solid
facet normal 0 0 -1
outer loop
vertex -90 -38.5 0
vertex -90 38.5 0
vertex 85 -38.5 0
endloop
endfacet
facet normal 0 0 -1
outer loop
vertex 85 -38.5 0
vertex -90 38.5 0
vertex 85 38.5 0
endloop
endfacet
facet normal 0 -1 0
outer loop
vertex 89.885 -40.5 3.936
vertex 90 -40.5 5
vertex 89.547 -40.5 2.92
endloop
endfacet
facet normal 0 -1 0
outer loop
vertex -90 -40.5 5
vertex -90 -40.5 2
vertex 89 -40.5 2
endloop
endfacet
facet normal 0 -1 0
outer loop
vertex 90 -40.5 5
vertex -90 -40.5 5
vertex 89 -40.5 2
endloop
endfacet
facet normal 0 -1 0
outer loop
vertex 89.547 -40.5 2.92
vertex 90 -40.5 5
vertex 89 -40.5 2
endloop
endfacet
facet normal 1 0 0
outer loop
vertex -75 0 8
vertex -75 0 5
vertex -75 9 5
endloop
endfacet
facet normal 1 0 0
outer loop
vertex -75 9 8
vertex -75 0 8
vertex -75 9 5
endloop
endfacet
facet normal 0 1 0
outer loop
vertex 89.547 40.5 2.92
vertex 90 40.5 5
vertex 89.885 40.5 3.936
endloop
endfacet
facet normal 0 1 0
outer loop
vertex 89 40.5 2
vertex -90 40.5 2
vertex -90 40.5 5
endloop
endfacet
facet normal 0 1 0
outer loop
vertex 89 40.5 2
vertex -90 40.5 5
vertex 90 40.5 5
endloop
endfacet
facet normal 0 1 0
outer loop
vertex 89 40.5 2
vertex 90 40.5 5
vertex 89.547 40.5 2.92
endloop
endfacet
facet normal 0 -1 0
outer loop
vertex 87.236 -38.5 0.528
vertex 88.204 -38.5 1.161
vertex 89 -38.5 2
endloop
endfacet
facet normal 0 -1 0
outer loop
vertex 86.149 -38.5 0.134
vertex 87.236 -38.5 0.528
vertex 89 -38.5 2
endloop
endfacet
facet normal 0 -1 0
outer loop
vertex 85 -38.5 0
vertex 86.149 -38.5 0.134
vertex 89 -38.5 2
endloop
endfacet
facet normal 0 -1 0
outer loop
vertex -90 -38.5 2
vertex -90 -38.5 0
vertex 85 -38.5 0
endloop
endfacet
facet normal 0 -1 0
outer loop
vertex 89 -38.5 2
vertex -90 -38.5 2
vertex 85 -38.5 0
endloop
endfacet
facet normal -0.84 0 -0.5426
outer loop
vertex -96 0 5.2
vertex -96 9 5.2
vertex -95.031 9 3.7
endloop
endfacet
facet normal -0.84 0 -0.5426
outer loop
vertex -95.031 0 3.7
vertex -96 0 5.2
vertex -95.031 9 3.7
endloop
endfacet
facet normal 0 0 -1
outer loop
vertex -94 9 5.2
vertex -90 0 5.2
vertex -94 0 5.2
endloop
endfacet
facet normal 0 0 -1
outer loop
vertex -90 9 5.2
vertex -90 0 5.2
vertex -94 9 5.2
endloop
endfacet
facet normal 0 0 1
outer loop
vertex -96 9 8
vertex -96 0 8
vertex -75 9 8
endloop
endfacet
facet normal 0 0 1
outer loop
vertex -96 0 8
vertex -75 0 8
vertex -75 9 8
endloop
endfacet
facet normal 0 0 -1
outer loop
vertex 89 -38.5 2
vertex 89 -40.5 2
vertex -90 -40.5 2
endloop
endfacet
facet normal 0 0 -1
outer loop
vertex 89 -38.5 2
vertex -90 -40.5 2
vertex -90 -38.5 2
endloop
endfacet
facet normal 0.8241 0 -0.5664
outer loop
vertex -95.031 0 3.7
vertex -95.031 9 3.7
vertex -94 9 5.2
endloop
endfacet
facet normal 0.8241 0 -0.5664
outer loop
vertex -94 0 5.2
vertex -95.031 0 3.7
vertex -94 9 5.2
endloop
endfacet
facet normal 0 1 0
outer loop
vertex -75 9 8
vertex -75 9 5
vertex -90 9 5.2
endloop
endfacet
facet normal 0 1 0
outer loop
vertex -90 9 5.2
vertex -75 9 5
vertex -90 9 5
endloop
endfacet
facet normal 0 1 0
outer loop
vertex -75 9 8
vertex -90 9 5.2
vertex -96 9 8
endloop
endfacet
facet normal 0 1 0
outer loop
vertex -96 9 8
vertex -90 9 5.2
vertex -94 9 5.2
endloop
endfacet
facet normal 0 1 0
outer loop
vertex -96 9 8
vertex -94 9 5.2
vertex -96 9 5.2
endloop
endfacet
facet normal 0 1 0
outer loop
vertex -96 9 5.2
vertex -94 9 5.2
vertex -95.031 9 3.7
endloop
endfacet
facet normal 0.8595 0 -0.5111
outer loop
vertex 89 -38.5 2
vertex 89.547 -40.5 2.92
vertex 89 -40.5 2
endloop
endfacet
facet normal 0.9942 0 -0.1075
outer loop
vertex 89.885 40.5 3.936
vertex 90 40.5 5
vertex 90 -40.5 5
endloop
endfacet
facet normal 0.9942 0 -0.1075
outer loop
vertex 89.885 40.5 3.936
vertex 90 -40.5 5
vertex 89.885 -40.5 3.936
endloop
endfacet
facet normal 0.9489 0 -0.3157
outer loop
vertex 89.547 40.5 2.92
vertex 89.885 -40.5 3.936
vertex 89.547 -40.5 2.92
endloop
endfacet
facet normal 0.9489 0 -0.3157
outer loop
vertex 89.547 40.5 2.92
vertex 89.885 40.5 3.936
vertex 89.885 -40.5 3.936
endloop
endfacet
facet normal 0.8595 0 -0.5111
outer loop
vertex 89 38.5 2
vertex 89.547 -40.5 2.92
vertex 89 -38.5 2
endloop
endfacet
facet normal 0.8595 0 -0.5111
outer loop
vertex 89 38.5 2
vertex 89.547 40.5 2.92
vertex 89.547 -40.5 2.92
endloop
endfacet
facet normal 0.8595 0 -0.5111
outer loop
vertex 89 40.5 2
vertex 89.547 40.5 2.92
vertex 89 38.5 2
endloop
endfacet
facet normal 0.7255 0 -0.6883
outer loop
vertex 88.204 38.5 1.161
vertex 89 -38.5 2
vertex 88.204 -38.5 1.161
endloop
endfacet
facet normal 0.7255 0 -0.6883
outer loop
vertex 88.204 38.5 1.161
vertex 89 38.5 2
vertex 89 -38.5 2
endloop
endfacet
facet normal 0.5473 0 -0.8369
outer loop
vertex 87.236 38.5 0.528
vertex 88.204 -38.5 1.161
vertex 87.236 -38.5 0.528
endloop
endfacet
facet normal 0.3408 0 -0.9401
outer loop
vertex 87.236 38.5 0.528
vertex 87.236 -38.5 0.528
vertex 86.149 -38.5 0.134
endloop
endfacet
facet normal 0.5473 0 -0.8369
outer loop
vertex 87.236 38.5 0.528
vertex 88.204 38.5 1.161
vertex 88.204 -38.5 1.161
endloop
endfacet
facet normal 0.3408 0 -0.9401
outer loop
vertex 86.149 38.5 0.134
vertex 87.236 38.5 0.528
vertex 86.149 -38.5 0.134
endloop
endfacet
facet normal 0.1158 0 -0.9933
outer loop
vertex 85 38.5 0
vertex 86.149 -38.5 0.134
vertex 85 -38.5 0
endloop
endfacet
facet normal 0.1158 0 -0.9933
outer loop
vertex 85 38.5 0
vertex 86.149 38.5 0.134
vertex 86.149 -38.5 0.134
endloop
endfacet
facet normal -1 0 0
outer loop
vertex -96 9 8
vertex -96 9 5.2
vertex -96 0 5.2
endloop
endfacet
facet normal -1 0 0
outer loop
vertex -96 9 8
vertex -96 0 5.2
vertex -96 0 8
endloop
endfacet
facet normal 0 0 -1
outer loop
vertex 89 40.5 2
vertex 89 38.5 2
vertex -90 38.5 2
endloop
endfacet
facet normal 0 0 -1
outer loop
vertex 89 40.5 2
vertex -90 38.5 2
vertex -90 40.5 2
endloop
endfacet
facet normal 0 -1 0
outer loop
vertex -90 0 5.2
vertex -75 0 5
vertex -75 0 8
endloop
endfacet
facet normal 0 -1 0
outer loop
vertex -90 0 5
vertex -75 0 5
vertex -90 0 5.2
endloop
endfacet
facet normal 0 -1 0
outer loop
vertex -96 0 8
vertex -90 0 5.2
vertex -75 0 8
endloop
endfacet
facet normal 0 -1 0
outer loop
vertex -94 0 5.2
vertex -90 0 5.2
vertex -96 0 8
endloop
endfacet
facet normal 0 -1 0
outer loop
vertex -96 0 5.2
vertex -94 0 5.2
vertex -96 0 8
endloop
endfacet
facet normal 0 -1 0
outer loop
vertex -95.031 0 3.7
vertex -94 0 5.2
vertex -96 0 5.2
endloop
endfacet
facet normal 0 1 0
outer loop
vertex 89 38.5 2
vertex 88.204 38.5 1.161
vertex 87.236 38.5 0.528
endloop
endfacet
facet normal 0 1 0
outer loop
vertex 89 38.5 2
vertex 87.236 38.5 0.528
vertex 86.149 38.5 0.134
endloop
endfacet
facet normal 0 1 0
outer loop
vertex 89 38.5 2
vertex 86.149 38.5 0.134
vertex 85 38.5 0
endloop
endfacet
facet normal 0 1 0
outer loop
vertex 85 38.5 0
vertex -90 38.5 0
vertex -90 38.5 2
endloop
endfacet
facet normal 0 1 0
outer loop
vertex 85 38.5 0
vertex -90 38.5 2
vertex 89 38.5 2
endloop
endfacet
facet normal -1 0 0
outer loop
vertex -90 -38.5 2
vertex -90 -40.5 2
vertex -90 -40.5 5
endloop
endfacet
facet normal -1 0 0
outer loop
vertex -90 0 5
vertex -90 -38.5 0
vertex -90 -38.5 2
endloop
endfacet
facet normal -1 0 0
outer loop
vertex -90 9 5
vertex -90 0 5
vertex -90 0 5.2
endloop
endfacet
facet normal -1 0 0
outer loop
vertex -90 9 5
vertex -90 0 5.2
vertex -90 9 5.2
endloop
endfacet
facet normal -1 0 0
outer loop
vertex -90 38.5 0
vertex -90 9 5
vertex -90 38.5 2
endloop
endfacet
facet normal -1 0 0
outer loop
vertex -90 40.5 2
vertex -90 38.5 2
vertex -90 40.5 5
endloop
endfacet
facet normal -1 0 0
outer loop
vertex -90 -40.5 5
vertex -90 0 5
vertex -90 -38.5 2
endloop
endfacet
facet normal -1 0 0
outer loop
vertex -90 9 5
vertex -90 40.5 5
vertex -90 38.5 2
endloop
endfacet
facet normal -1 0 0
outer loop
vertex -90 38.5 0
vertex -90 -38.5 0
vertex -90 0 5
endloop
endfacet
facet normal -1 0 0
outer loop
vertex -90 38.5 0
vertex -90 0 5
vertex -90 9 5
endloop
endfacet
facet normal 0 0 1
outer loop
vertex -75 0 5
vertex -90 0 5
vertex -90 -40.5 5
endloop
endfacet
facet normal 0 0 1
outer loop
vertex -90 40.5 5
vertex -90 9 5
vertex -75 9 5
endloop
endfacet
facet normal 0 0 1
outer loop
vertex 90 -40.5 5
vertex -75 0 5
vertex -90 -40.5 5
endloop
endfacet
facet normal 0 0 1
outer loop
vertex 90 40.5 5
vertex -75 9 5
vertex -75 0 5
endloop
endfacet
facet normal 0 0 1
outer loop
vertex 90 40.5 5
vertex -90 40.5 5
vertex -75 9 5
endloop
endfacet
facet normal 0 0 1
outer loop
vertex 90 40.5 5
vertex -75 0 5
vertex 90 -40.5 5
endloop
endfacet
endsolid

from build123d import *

# Parameters (mm, degrees)
SKETCH1_W           = 180
SKETCH1_H           = 81
BOSS_EXTRUDE1_DEPTH = 5
FILLET1_R           = 5
SKETCH2_W           = 2
SKETCH2_H           = 2
CUT_EXTRUDE1_DEPTH  = 185.567738243
SKETCH3_W           = 15
SKETCH3_H           = 9
BOSS_EXTRUDE2_DEPTH = 3
SKETCH4_W           = 2.8
SKETCH4_H           = 9
BOSS_EXTRUDE3_DEPTH = 6
BOSS_EXTRUDE4_DEPTH = 9


with BuildPart() as part:
    # Sketch1 → Boss-Extrude1 (new body)
    with BuildSketch(Plane.XY):
        Rectangle(SKETCH1_W, SKETCH1_H)
    extrude(amount=BOSS_EXTRUDE1_DEPTH)

    # Fillet1
    fillet1_edges = [part.edges().sort_by_distance(p)[0] for p in [
        (90, 0, 0),
    ]]
    fillet(fillet1_edges, radius=FILLET1_R - 0.0001)  # a hair under: the kernel refuses the full size

    # Sketch2 → Cut-Extrude1 (cut, through all)
    with BuildSketch(Plane.ZY.offset(90)):
        with Locations((1, 39.5)):
            Rectangle(SKETCH2_W, SKETCH2_H)
        with Locations((1, -39.5)):
            Rectangle(SKETCH2_W, SKETCH2_H)
    extrude(amount=-CUT_EXTRUDE1_DEPTH, mode=Mode.SUBTRACT)

    # Sketch3 → Boss-Extrude2 (add)
    with BuildSketch(Plane.XY.offset(5)):
        with Locations((-82.5, 4.5)):
            Rectangle(SKETCH3_W, SKETCH3_H)
    extrude(amount=BOSS_EXTRUDE2_DEPTH)

    # Sketch4 → Boss-Extrude3 (add)
    with BuildSketch(Plane.ZY.offset(90)):
        with Locations((6.6, 4.5)):
            Rectangle(SKETCH4_W, SKETCH4_H)
    extrude(amount=BOSS_EXTRUDE3_DEPTH)

    # Sketch5 → Boss-Extrude4 (add)
    with BuildSketch(Plane(origin=(0, 9, 0), x_dir=(1, 0, 0), z_dir=(0, 1, 0))):
        Polygon((-96, -5.2), (-95.031000632, -3.7), (-94, -5.2), align=None)
    extrude(amount=-BOSS_EXTRUDE4_DEPTH)


solid = part.part
